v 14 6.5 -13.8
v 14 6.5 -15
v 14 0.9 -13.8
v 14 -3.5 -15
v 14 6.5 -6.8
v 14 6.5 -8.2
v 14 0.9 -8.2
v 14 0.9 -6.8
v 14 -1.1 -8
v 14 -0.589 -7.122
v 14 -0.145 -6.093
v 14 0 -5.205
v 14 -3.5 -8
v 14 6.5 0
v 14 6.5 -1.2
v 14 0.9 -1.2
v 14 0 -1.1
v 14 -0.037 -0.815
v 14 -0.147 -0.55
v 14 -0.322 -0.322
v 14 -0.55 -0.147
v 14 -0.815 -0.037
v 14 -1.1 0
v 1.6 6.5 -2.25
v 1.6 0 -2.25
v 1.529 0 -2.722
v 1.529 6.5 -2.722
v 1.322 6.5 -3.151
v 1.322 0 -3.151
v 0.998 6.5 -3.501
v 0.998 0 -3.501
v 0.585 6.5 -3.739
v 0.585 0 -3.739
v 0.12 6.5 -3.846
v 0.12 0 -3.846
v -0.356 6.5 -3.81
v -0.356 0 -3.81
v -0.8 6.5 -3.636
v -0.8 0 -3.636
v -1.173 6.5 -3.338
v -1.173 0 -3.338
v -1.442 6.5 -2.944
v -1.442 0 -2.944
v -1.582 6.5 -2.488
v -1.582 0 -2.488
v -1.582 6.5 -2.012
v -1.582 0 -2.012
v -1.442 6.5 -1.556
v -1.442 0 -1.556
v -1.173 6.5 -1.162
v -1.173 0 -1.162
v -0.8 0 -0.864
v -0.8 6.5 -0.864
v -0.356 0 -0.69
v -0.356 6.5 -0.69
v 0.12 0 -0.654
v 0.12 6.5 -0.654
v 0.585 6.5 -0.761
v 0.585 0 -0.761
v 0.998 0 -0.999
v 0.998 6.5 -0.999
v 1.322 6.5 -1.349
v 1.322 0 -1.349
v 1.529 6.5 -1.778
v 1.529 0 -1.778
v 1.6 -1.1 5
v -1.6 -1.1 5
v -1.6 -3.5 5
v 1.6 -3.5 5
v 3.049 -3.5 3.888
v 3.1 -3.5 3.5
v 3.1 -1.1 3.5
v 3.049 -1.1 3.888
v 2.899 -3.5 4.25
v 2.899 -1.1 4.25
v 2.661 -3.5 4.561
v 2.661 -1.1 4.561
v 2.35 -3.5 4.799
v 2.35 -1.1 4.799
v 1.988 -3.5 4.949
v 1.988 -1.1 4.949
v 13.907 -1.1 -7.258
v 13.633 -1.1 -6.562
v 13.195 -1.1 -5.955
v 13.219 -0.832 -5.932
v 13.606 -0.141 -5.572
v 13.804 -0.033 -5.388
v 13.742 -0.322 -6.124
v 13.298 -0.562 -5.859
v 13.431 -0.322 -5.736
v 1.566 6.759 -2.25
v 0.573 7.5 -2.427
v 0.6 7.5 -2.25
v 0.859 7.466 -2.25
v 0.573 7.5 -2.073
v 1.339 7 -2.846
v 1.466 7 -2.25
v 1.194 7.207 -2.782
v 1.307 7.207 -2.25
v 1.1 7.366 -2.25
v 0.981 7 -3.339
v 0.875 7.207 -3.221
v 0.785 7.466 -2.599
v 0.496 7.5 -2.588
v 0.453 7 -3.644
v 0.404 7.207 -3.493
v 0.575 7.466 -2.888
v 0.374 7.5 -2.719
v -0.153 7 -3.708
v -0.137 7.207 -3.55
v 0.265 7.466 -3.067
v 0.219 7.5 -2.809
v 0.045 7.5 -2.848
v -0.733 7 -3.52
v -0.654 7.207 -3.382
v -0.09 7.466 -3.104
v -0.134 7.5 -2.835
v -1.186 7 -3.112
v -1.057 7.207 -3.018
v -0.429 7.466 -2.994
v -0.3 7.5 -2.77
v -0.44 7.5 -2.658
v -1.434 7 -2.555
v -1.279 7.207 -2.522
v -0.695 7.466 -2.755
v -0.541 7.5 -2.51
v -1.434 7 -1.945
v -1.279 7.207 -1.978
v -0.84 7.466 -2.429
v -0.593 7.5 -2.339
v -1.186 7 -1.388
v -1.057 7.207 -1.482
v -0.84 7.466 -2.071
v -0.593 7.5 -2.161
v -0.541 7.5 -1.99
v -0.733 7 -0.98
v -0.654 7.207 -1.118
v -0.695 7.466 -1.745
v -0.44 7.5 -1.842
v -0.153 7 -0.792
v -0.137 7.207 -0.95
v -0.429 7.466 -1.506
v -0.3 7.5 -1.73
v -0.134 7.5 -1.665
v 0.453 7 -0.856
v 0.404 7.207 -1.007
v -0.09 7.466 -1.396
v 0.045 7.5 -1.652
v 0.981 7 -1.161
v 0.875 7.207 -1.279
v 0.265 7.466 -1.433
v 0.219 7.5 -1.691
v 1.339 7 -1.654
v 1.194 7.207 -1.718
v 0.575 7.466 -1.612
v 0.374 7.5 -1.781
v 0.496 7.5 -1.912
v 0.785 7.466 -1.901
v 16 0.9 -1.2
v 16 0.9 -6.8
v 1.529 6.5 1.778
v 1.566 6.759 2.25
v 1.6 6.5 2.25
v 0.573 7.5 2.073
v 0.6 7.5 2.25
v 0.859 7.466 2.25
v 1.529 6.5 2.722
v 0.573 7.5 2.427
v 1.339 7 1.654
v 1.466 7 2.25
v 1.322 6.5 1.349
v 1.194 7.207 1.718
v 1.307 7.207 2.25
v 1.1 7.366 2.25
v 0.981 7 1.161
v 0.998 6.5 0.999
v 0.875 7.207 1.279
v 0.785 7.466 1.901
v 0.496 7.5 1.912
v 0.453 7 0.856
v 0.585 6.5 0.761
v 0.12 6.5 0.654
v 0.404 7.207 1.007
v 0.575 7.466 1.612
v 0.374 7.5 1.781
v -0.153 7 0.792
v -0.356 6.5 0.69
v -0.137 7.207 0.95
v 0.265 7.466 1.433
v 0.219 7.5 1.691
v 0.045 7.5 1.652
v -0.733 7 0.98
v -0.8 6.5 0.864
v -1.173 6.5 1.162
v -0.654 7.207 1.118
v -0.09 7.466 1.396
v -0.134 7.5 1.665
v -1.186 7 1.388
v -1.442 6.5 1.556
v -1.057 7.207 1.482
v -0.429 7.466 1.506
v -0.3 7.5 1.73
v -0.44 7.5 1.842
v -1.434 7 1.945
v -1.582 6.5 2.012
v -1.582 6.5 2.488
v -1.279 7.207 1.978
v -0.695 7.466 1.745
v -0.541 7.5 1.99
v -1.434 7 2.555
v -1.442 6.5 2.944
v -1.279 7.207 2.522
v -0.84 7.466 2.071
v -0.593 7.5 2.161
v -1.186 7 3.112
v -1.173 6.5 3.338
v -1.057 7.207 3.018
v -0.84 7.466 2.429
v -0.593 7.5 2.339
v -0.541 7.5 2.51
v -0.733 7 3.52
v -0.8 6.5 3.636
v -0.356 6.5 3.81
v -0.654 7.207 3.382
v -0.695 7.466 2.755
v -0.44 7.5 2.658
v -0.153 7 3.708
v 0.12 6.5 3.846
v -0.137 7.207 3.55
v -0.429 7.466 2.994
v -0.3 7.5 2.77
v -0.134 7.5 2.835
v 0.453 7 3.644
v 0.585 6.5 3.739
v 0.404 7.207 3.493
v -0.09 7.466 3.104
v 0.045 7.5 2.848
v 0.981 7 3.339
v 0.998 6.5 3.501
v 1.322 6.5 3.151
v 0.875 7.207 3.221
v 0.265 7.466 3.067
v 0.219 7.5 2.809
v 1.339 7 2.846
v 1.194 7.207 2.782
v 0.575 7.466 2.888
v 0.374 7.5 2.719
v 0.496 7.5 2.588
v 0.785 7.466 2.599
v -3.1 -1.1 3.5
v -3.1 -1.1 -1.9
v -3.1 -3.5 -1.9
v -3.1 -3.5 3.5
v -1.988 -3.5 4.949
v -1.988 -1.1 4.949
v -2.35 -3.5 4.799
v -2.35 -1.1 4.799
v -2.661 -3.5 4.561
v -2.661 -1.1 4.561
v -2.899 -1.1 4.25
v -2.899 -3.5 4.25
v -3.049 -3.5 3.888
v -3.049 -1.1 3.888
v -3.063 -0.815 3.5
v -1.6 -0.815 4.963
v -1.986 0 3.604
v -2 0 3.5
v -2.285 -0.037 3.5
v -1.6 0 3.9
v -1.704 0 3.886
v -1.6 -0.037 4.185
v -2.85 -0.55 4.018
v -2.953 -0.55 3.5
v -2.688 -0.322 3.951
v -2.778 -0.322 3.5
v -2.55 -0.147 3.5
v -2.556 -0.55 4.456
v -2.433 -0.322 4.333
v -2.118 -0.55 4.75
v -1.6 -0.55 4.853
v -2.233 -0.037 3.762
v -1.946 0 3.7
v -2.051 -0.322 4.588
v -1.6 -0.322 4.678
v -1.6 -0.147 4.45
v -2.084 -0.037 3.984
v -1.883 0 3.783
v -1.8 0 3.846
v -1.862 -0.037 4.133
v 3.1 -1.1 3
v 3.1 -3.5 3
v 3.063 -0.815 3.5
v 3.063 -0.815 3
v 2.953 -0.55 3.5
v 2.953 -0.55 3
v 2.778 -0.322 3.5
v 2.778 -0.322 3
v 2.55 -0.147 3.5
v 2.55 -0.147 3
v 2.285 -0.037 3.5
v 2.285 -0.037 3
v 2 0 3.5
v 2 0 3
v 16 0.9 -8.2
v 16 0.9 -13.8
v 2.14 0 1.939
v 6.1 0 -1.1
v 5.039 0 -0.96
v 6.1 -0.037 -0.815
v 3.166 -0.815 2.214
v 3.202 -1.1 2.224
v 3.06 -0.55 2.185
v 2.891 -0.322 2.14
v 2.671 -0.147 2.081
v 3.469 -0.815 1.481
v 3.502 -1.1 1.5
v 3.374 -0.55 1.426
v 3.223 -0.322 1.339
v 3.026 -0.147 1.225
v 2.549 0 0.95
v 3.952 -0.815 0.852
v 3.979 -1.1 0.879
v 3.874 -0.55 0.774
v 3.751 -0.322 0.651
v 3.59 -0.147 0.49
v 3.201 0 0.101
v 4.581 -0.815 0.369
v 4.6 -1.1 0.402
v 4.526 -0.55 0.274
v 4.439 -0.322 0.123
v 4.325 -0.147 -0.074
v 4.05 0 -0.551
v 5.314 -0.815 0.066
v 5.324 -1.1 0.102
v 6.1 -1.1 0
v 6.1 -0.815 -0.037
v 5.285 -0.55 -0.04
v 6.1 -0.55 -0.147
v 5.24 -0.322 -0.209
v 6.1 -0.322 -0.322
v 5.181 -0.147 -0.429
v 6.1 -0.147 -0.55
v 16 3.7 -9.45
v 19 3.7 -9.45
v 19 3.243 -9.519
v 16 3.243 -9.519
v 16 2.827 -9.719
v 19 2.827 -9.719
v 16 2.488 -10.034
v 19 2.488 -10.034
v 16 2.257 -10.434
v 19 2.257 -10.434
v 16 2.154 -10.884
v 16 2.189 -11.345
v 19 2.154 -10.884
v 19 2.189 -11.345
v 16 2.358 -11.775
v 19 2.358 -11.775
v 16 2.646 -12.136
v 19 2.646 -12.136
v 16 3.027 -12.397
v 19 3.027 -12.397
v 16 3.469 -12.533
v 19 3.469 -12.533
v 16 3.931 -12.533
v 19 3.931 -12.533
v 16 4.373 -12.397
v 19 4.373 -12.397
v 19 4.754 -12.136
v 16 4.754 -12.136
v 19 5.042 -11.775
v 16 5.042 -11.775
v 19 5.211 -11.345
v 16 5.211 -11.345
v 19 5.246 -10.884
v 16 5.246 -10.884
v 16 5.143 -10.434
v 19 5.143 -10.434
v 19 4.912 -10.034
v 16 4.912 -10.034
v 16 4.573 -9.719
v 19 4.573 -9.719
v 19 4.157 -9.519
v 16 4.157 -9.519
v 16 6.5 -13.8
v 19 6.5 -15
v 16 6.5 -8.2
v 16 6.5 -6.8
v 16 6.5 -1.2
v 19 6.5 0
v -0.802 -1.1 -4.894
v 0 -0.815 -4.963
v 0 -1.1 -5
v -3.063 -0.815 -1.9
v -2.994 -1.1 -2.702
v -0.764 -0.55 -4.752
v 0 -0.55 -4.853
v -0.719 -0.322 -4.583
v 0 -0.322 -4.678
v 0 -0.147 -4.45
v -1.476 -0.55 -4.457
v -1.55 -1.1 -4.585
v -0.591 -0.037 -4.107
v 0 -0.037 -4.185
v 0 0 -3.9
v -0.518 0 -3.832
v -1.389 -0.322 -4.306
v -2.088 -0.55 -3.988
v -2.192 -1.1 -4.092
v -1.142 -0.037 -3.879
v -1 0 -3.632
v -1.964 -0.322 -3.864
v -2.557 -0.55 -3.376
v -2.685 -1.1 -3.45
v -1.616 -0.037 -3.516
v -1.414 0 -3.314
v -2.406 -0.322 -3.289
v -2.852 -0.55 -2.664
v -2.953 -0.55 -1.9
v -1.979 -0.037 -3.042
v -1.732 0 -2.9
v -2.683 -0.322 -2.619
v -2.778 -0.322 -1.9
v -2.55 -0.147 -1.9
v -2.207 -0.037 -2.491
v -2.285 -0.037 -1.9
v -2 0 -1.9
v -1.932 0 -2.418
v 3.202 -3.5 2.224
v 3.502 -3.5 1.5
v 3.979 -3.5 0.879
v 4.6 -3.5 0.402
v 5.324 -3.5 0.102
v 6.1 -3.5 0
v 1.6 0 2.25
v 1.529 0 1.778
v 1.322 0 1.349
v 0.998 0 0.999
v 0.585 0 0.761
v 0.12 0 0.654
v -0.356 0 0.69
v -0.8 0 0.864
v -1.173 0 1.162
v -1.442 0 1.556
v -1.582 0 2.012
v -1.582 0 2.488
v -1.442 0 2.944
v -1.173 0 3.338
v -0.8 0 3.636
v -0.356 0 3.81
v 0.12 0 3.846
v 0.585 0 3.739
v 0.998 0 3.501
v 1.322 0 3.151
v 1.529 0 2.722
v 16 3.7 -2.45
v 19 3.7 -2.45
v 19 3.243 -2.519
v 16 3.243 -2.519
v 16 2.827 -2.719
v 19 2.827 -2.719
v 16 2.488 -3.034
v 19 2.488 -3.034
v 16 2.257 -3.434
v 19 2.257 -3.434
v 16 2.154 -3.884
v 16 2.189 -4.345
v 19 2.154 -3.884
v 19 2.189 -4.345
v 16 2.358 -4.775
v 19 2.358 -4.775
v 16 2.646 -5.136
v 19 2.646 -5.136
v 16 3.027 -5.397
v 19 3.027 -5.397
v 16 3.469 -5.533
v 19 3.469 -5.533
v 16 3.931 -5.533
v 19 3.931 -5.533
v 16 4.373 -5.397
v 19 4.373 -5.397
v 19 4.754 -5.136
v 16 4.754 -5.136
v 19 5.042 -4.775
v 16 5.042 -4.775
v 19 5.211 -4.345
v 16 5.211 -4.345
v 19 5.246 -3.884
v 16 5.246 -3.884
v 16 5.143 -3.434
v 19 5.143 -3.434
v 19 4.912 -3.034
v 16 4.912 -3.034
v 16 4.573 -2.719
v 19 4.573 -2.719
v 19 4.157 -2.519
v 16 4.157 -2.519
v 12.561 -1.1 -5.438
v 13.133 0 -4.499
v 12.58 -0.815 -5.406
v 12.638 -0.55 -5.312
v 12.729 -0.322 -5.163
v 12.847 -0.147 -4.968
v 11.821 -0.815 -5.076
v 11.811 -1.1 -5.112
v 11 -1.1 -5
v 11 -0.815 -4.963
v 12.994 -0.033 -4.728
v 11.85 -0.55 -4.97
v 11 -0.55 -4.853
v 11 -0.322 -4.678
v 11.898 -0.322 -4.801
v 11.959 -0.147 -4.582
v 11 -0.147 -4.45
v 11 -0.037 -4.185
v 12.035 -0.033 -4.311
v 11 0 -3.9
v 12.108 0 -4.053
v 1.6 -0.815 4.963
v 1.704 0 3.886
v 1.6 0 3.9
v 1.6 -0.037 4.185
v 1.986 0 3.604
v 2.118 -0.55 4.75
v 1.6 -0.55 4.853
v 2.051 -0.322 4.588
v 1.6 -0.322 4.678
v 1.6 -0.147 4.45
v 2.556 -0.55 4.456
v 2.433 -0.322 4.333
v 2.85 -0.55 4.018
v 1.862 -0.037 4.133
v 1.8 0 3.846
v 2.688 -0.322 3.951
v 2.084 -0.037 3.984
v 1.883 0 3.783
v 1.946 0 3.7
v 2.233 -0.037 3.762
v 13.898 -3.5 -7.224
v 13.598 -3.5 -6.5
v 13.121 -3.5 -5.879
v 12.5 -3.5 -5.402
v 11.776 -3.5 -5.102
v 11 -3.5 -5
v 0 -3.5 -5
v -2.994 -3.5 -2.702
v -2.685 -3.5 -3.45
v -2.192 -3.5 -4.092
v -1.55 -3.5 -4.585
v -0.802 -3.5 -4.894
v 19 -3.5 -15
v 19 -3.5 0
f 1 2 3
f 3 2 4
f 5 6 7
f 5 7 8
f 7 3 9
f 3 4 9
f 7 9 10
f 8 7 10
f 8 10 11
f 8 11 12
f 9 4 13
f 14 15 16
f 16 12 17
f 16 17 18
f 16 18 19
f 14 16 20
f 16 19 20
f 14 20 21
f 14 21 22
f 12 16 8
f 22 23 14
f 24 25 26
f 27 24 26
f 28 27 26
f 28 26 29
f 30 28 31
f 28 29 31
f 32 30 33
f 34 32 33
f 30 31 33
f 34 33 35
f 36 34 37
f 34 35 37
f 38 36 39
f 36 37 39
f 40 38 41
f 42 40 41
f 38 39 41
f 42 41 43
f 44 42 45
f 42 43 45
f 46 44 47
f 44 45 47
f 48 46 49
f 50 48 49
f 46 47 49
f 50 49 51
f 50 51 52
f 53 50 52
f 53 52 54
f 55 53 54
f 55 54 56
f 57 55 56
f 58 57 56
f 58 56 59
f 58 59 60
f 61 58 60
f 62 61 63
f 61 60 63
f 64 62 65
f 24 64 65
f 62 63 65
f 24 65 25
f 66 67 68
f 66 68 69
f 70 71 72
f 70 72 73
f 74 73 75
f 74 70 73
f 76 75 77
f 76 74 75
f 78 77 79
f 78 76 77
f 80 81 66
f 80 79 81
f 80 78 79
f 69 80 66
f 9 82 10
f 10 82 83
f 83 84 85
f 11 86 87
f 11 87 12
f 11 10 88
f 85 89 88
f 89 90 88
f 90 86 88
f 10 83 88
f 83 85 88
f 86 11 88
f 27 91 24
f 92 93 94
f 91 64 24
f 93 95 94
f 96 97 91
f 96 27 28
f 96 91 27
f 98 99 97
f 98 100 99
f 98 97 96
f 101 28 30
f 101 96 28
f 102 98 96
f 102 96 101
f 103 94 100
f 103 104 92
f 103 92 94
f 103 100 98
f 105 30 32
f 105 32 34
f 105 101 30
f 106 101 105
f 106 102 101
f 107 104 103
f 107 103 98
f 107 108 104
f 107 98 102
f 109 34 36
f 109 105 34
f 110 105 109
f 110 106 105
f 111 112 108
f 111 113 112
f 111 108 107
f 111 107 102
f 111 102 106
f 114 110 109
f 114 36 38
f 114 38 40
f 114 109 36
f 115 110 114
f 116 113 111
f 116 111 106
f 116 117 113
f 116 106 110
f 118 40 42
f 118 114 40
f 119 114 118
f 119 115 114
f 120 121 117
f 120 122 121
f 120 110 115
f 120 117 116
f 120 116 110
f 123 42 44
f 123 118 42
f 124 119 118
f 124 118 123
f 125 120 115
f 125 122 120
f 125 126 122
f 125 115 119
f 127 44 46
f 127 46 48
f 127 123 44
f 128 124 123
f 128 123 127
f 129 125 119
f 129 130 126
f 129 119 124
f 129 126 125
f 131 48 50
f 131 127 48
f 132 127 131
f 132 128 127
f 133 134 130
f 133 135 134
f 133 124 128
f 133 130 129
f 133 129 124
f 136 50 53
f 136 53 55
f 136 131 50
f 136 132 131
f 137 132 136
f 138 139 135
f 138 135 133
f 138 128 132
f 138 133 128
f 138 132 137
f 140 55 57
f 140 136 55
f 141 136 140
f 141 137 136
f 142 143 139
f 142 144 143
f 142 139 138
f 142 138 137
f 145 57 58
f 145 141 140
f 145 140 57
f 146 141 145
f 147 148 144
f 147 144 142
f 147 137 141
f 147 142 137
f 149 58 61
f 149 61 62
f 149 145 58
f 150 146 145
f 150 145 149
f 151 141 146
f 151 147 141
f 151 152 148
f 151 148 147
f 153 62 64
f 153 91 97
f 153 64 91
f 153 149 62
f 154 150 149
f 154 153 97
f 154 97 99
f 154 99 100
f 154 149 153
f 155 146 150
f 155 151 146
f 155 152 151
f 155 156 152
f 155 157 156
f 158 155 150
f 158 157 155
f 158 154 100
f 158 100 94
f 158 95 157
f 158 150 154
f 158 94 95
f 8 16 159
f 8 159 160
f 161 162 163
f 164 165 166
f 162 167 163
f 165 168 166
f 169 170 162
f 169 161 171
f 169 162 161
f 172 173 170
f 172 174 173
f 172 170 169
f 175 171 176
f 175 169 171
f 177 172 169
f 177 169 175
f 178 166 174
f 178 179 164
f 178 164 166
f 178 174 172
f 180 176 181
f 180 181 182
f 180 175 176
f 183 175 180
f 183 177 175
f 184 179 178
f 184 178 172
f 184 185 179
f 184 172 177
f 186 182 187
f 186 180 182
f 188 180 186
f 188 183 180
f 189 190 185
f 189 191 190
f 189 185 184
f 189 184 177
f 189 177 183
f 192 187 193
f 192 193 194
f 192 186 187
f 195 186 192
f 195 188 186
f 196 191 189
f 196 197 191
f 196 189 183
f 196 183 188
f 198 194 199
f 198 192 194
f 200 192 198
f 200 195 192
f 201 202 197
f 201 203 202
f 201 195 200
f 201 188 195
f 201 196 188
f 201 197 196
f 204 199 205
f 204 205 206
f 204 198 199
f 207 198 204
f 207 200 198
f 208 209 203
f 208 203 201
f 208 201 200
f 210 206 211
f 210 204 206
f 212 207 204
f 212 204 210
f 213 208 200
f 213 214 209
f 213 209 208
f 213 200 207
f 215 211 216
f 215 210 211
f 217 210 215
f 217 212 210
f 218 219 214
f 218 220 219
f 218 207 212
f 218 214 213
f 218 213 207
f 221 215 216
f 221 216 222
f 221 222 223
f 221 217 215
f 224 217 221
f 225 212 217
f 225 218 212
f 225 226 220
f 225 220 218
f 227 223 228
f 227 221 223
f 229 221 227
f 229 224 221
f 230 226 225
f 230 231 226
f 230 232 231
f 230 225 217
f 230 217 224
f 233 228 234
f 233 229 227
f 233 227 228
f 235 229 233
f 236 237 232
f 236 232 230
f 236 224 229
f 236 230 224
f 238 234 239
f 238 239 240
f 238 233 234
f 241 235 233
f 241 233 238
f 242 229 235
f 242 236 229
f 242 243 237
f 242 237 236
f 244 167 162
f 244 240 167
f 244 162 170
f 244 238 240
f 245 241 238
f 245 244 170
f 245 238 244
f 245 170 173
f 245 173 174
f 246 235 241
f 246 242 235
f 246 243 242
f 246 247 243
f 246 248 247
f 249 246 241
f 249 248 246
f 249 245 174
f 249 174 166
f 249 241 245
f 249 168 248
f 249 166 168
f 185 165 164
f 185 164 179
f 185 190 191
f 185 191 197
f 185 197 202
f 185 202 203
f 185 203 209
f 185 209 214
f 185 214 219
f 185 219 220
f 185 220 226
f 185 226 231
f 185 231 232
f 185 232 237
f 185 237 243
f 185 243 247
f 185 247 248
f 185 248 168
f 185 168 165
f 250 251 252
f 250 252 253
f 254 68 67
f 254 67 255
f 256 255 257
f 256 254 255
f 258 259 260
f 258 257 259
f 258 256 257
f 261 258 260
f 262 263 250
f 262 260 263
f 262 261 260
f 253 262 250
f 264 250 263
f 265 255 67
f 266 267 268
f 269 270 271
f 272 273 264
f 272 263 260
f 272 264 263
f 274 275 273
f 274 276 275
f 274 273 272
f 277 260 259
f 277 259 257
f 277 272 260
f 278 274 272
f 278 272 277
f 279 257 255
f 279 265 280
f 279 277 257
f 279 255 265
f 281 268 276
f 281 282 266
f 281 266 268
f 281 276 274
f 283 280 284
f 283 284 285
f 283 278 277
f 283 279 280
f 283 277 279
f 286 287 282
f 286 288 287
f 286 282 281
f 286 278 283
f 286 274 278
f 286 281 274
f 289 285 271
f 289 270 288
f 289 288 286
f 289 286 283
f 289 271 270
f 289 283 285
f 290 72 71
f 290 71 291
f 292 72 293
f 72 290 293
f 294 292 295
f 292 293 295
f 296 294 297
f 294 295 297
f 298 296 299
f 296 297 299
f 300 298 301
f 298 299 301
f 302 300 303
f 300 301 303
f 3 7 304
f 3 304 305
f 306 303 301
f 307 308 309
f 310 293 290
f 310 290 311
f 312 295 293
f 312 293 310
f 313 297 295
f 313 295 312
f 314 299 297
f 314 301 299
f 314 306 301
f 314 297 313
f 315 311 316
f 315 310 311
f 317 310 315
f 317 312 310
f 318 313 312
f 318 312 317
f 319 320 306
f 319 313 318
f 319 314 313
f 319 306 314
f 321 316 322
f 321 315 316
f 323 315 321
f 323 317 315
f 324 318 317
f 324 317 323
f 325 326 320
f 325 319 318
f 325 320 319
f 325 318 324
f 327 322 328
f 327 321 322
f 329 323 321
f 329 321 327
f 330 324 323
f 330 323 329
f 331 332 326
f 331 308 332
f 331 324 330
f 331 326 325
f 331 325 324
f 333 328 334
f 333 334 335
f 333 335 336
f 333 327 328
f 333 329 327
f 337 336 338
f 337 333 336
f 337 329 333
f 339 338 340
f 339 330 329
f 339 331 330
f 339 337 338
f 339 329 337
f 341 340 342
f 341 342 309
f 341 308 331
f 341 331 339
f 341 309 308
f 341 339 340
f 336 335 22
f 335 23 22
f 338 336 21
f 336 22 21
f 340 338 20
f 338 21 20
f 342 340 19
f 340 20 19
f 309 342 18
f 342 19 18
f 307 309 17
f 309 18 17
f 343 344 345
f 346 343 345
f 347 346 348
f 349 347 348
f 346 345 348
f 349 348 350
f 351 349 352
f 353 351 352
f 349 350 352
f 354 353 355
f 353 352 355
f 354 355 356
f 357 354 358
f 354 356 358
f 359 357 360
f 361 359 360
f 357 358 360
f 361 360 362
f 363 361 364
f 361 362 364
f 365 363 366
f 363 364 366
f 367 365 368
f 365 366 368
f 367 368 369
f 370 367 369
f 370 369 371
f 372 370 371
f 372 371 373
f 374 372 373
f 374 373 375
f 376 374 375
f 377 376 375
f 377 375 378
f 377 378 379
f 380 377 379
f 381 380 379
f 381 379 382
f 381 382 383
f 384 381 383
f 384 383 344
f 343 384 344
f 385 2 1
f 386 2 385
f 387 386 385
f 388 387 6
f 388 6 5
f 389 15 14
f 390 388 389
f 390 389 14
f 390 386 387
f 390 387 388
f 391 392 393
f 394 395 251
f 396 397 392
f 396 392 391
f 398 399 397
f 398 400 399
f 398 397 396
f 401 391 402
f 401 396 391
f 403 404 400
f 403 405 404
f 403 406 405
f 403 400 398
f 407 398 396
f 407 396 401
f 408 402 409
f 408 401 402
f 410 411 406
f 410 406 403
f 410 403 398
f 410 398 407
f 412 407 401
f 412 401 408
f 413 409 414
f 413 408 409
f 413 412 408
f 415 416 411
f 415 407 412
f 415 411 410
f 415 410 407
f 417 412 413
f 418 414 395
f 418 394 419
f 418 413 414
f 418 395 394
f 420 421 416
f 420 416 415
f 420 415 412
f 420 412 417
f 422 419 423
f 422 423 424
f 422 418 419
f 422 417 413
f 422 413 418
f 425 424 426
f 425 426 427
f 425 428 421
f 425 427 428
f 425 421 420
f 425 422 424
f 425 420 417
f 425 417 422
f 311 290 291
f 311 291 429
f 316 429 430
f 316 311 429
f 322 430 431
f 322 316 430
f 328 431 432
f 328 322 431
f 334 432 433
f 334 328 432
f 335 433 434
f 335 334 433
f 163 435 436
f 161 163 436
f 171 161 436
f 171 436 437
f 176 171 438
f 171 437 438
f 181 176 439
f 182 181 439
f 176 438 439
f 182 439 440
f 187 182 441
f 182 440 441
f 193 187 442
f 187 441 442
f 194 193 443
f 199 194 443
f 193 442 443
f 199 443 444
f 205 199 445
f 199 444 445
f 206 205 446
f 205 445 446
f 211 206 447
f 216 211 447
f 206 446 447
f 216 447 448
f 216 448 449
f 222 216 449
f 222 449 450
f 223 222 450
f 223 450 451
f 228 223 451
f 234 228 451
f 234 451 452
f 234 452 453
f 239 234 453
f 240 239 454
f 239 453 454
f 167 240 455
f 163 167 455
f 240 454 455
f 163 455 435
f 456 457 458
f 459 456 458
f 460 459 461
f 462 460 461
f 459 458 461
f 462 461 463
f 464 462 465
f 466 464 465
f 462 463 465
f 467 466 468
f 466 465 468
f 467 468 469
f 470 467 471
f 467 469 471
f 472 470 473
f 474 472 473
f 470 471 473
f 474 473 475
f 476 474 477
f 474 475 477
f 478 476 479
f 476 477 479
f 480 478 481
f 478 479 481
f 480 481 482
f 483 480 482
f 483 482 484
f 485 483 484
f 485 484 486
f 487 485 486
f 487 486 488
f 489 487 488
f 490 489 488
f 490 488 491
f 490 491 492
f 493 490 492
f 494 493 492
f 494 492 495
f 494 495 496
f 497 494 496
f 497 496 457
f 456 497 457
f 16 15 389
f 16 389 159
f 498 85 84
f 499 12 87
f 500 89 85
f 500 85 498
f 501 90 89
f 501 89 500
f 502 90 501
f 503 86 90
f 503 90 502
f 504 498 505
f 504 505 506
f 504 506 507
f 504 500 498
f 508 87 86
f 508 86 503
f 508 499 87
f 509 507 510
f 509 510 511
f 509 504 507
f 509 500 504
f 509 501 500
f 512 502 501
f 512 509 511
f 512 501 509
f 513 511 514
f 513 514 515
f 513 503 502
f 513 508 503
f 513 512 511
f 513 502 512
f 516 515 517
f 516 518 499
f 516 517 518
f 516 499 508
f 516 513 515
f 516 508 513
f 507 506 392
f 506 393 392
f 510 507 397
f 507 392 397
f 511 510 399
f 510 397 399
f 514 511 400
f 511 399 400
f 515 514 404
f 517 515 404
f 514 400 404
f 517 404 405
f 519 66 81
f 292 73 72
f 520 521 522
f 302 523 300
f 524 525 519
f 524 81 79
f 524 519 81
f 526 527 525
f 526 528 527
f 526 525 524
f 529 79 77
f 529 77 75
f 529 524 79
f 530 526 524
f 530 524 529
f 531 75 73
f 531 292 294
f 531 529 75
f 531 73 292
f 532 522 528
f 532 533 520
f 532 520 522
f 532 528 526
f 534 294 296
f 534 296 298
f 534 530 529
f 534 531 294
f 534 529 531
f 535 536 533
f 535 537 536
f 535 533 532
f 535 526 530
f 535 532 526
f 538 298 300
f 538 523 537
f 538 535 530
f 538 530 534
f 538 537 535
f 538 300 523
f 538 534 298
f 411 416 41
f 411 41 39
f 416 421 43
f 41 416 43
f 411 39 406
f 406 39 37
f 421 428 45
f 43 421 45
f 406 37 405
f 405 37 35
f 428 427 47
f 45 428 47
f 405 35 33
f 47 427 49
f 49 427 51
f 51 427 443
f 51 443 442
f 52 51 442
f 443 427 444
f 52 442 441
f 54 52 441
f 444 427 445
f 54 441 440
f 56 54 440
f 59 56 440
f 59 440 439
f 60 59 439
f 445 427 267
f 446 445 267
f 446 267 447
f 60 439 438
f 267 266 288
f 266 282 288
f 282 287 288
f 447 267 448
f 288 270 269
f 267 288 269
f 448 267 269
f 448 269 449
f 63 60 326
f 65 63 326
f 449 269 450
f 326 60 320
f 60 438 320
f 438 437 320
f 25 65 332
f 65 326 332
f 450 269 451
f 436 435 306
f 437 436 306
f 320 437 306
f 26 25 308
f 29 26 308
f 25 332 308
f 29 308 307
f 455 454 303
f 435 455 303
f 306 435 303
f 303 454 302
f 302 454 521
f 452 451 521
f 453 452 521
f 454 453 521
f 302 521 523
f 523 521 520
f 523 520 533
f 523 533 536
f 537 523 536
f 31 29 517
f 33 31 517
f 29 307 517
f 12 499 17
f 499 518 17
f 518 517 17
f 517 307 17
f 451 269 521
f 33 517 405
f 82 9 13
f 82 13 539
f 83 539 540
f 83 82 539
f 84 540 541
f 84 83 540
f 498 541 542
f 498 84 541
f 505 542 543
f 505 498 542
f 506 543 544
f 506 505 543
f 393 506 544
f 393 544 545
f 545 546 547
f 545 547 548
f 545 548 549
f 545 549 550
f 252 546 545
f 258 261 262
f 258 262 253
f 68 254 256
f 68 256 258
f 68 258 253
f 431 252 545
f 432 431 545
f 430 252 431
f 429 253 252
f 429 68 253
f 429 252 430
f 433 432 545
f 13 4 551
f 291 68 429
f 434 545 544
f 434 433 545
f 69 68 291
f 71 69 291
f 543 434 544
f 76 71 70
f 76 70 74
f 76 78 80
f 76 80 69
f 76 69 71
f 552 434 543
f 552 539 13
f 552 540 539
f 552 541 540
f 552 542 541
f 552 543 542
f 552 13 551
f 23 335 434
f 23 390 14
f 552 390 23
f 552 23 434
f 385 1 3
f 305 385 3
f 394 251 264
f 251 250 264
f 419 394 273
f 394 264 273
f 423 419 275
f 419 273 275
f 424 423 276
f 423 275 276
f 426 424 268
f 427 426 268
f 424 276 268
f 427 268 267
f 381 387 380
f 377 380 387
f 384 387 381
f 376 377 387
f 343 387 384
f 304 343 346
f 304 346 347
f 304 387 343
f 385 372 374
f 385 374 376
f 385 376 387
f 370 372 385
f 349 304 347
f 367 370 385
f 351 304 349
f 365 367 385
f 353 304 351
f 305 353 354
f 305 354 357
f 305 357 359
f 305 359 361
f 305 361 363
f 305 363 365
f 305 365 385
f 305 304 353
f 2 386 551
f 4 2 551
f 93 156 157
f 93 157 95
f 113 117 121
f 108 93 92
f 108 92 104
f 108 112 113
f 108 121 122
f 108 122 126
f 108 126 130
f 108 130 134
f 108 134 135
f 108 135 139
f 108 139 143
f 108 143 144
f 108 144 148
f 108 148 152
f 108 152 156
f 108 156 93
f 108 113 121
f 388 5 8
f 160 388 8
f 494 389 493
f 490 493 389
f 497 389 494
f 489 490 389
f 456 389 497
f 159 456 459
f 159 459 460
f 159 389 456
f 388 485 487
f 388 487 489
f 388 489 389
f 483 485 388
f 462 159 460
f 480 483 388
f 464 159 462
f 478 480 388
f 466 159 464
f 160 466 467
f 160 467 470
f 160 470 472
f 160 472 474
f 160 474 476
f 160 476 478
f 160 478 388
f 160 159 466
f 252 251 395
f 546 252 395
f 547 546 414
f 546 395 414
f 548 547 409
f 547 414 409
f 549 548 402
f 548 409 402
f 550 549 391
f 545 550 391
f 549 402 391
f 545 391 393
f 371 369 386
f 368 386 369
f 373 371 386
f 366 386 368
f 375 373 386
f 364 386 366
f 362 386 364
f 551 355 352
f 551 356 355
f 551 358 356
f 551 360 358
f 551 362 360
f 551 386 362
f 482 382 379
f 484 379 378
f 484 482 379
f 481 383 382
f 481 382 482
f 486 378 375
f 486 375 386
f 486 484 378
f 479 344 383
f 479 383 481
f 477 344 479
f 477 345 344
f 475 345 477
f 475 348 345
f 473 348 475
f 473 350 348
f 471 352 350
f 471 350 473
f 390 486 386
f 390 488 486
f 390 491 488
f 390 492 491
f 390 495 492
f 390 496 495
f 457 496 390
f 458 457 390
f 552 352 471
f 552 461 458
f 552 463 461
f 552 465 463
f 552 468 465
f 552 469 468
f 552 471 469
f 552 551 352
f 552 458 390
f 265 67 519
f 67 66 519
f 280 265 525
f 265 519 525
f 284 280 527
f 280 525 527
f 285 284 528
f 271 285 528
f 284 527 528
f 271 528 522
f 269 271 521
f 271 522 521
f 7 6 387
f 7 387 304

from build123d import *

# Parameters (mm, degrees)
PAD_DEPTH    = 3.5
SKETCH001_W  = 15
SKETCH001_H  = 6.5
SKETCH001_R  = 1.55
PAD001_DEPTH = 5
SKETCH002_W  = 5.6
SKETCH002_H  = 5.6
POCKET_DEPTH = 2
SKETCH003_R  = 1.6
PAD002_DEPTH = 7.5
FILLET_R     = 1.5
FILLET001_R  = 1.1
FILLET002_R  = 1


with BuildPart() as part:
    # Sketch → Pad (new body)
    with BuildSketch(Plane.XZ):
        with BuildLine():
            Line((14, -8), (14, -15))
            Line((14, -15), (19, -15))
            Line((19, -15), (19, 0))
            Line((6.1, 0), (19, 0))
            ThreePointArc((3.1, 3), (3.97868, 0.87868), (6.1, 0))
            Line((3.1, 5), (3.1, 3))
            Line((-3.1, 5), (3.1, 5))
            Line((-3.1, -1.9), (-3.1, 5))
            ThreePointArc((-3.1, -1.9), (-2.192031, -4.092031), (0, -5))
            Line((11, -5), (0, -5))
            ThreePointArc((14, -8), (13.12132, -5.87868), (11, -5))
        make_face()
    extrude(amount=PAD_DEPTH)

    # Sketch001 (on Face4 of Pad) → Pad001 (join)
    with BuildSketch(Plane(origin=(19, 0, 0), x_dir=(0, 0, 1), z_dir=(1, 0, 0))):
        with Locations((-7.5, -3.25)):
            Rectangle(SKETCH001_W, SKETCH001_H)
        with Locations((-4, -3.7)):
            Circle(SKETCH001_R, mode=Mode.SUBTRACT)
        with Locations((-11, -3.7)):
            Circle(SKETCH001_R, mode=Mode.SUBTRACT)
    extrude(amount=-PAD001_DEPTH)

    # Sketch002 (on Face10 of Pad001) → Pocket (cut)
    with BuildSketch(Plane(origin=(14, 0, 0), x_dir=(0, 0, -1), z_dir=(-1, 0, 0))):
        with Locations((4, -3.7)):
            Rectangle(SKETCH002_W, SKETCH002_H)
        with Locations((11, -3.7)):
            Rectangle(SKETCH002_W, SKETCH002_H)
    extrude(amount=-POCKET_DEPTH, mode=Mode.SUBTRACT)

    # Sketch003 (on Face4 of Pocket) → Pad002 (join)
    with BuildSketch(Plane(origin=(0, 0, 0), x_dir=(1, 0, 0), z_dir=(0, 1, 0))):
        with Locations((0, 2.25)):
            Circle(SKETCH003_R)
        with Locations((0, -2.25)):
            Circle(SKETCH003_R)
    extrude(amount=PAD002_DEPTH)

    # Fillet
    fillet_edges = [part.edges().sort_by_distance(p)[0] for p in [
        (-3.1, -1.75, 5),
        (3.1, -1.75, 5),
    ]]
    fillet(fillet_edges, radius=FILLET_R)

    # Fillet001
    fillet001_edges = [part.edges().sort_by_distance(p)[0] for p in [
        (10.05, 0, 0),
        (3.97868, 0, 0.87868),
        (3.1, 0, 3.25),
        (2.66066, 0, 4.56066),
        (0, 0, 5),
        (-2.66066, 0, 4.56066),
        (-3.1, 0, 0.8),
        (-2.192031, 0, -4.092031),
        (5.5, 0, -5),
        (13.12132, 0, -5.87868),
    ]]
    fillet(fillet001_edges, radius=FILLET001_R)

    # Fillet002
    fillet002_edges = [part.edges().sort_by_distance(p)[0] for p in [
        (-1.6, 7.5, 2.25),
        (-1.6, 7.5, -2.25),
    ]]
    fillet(fillet002_edges, radius=FILLET002_R)


solid = part.part
